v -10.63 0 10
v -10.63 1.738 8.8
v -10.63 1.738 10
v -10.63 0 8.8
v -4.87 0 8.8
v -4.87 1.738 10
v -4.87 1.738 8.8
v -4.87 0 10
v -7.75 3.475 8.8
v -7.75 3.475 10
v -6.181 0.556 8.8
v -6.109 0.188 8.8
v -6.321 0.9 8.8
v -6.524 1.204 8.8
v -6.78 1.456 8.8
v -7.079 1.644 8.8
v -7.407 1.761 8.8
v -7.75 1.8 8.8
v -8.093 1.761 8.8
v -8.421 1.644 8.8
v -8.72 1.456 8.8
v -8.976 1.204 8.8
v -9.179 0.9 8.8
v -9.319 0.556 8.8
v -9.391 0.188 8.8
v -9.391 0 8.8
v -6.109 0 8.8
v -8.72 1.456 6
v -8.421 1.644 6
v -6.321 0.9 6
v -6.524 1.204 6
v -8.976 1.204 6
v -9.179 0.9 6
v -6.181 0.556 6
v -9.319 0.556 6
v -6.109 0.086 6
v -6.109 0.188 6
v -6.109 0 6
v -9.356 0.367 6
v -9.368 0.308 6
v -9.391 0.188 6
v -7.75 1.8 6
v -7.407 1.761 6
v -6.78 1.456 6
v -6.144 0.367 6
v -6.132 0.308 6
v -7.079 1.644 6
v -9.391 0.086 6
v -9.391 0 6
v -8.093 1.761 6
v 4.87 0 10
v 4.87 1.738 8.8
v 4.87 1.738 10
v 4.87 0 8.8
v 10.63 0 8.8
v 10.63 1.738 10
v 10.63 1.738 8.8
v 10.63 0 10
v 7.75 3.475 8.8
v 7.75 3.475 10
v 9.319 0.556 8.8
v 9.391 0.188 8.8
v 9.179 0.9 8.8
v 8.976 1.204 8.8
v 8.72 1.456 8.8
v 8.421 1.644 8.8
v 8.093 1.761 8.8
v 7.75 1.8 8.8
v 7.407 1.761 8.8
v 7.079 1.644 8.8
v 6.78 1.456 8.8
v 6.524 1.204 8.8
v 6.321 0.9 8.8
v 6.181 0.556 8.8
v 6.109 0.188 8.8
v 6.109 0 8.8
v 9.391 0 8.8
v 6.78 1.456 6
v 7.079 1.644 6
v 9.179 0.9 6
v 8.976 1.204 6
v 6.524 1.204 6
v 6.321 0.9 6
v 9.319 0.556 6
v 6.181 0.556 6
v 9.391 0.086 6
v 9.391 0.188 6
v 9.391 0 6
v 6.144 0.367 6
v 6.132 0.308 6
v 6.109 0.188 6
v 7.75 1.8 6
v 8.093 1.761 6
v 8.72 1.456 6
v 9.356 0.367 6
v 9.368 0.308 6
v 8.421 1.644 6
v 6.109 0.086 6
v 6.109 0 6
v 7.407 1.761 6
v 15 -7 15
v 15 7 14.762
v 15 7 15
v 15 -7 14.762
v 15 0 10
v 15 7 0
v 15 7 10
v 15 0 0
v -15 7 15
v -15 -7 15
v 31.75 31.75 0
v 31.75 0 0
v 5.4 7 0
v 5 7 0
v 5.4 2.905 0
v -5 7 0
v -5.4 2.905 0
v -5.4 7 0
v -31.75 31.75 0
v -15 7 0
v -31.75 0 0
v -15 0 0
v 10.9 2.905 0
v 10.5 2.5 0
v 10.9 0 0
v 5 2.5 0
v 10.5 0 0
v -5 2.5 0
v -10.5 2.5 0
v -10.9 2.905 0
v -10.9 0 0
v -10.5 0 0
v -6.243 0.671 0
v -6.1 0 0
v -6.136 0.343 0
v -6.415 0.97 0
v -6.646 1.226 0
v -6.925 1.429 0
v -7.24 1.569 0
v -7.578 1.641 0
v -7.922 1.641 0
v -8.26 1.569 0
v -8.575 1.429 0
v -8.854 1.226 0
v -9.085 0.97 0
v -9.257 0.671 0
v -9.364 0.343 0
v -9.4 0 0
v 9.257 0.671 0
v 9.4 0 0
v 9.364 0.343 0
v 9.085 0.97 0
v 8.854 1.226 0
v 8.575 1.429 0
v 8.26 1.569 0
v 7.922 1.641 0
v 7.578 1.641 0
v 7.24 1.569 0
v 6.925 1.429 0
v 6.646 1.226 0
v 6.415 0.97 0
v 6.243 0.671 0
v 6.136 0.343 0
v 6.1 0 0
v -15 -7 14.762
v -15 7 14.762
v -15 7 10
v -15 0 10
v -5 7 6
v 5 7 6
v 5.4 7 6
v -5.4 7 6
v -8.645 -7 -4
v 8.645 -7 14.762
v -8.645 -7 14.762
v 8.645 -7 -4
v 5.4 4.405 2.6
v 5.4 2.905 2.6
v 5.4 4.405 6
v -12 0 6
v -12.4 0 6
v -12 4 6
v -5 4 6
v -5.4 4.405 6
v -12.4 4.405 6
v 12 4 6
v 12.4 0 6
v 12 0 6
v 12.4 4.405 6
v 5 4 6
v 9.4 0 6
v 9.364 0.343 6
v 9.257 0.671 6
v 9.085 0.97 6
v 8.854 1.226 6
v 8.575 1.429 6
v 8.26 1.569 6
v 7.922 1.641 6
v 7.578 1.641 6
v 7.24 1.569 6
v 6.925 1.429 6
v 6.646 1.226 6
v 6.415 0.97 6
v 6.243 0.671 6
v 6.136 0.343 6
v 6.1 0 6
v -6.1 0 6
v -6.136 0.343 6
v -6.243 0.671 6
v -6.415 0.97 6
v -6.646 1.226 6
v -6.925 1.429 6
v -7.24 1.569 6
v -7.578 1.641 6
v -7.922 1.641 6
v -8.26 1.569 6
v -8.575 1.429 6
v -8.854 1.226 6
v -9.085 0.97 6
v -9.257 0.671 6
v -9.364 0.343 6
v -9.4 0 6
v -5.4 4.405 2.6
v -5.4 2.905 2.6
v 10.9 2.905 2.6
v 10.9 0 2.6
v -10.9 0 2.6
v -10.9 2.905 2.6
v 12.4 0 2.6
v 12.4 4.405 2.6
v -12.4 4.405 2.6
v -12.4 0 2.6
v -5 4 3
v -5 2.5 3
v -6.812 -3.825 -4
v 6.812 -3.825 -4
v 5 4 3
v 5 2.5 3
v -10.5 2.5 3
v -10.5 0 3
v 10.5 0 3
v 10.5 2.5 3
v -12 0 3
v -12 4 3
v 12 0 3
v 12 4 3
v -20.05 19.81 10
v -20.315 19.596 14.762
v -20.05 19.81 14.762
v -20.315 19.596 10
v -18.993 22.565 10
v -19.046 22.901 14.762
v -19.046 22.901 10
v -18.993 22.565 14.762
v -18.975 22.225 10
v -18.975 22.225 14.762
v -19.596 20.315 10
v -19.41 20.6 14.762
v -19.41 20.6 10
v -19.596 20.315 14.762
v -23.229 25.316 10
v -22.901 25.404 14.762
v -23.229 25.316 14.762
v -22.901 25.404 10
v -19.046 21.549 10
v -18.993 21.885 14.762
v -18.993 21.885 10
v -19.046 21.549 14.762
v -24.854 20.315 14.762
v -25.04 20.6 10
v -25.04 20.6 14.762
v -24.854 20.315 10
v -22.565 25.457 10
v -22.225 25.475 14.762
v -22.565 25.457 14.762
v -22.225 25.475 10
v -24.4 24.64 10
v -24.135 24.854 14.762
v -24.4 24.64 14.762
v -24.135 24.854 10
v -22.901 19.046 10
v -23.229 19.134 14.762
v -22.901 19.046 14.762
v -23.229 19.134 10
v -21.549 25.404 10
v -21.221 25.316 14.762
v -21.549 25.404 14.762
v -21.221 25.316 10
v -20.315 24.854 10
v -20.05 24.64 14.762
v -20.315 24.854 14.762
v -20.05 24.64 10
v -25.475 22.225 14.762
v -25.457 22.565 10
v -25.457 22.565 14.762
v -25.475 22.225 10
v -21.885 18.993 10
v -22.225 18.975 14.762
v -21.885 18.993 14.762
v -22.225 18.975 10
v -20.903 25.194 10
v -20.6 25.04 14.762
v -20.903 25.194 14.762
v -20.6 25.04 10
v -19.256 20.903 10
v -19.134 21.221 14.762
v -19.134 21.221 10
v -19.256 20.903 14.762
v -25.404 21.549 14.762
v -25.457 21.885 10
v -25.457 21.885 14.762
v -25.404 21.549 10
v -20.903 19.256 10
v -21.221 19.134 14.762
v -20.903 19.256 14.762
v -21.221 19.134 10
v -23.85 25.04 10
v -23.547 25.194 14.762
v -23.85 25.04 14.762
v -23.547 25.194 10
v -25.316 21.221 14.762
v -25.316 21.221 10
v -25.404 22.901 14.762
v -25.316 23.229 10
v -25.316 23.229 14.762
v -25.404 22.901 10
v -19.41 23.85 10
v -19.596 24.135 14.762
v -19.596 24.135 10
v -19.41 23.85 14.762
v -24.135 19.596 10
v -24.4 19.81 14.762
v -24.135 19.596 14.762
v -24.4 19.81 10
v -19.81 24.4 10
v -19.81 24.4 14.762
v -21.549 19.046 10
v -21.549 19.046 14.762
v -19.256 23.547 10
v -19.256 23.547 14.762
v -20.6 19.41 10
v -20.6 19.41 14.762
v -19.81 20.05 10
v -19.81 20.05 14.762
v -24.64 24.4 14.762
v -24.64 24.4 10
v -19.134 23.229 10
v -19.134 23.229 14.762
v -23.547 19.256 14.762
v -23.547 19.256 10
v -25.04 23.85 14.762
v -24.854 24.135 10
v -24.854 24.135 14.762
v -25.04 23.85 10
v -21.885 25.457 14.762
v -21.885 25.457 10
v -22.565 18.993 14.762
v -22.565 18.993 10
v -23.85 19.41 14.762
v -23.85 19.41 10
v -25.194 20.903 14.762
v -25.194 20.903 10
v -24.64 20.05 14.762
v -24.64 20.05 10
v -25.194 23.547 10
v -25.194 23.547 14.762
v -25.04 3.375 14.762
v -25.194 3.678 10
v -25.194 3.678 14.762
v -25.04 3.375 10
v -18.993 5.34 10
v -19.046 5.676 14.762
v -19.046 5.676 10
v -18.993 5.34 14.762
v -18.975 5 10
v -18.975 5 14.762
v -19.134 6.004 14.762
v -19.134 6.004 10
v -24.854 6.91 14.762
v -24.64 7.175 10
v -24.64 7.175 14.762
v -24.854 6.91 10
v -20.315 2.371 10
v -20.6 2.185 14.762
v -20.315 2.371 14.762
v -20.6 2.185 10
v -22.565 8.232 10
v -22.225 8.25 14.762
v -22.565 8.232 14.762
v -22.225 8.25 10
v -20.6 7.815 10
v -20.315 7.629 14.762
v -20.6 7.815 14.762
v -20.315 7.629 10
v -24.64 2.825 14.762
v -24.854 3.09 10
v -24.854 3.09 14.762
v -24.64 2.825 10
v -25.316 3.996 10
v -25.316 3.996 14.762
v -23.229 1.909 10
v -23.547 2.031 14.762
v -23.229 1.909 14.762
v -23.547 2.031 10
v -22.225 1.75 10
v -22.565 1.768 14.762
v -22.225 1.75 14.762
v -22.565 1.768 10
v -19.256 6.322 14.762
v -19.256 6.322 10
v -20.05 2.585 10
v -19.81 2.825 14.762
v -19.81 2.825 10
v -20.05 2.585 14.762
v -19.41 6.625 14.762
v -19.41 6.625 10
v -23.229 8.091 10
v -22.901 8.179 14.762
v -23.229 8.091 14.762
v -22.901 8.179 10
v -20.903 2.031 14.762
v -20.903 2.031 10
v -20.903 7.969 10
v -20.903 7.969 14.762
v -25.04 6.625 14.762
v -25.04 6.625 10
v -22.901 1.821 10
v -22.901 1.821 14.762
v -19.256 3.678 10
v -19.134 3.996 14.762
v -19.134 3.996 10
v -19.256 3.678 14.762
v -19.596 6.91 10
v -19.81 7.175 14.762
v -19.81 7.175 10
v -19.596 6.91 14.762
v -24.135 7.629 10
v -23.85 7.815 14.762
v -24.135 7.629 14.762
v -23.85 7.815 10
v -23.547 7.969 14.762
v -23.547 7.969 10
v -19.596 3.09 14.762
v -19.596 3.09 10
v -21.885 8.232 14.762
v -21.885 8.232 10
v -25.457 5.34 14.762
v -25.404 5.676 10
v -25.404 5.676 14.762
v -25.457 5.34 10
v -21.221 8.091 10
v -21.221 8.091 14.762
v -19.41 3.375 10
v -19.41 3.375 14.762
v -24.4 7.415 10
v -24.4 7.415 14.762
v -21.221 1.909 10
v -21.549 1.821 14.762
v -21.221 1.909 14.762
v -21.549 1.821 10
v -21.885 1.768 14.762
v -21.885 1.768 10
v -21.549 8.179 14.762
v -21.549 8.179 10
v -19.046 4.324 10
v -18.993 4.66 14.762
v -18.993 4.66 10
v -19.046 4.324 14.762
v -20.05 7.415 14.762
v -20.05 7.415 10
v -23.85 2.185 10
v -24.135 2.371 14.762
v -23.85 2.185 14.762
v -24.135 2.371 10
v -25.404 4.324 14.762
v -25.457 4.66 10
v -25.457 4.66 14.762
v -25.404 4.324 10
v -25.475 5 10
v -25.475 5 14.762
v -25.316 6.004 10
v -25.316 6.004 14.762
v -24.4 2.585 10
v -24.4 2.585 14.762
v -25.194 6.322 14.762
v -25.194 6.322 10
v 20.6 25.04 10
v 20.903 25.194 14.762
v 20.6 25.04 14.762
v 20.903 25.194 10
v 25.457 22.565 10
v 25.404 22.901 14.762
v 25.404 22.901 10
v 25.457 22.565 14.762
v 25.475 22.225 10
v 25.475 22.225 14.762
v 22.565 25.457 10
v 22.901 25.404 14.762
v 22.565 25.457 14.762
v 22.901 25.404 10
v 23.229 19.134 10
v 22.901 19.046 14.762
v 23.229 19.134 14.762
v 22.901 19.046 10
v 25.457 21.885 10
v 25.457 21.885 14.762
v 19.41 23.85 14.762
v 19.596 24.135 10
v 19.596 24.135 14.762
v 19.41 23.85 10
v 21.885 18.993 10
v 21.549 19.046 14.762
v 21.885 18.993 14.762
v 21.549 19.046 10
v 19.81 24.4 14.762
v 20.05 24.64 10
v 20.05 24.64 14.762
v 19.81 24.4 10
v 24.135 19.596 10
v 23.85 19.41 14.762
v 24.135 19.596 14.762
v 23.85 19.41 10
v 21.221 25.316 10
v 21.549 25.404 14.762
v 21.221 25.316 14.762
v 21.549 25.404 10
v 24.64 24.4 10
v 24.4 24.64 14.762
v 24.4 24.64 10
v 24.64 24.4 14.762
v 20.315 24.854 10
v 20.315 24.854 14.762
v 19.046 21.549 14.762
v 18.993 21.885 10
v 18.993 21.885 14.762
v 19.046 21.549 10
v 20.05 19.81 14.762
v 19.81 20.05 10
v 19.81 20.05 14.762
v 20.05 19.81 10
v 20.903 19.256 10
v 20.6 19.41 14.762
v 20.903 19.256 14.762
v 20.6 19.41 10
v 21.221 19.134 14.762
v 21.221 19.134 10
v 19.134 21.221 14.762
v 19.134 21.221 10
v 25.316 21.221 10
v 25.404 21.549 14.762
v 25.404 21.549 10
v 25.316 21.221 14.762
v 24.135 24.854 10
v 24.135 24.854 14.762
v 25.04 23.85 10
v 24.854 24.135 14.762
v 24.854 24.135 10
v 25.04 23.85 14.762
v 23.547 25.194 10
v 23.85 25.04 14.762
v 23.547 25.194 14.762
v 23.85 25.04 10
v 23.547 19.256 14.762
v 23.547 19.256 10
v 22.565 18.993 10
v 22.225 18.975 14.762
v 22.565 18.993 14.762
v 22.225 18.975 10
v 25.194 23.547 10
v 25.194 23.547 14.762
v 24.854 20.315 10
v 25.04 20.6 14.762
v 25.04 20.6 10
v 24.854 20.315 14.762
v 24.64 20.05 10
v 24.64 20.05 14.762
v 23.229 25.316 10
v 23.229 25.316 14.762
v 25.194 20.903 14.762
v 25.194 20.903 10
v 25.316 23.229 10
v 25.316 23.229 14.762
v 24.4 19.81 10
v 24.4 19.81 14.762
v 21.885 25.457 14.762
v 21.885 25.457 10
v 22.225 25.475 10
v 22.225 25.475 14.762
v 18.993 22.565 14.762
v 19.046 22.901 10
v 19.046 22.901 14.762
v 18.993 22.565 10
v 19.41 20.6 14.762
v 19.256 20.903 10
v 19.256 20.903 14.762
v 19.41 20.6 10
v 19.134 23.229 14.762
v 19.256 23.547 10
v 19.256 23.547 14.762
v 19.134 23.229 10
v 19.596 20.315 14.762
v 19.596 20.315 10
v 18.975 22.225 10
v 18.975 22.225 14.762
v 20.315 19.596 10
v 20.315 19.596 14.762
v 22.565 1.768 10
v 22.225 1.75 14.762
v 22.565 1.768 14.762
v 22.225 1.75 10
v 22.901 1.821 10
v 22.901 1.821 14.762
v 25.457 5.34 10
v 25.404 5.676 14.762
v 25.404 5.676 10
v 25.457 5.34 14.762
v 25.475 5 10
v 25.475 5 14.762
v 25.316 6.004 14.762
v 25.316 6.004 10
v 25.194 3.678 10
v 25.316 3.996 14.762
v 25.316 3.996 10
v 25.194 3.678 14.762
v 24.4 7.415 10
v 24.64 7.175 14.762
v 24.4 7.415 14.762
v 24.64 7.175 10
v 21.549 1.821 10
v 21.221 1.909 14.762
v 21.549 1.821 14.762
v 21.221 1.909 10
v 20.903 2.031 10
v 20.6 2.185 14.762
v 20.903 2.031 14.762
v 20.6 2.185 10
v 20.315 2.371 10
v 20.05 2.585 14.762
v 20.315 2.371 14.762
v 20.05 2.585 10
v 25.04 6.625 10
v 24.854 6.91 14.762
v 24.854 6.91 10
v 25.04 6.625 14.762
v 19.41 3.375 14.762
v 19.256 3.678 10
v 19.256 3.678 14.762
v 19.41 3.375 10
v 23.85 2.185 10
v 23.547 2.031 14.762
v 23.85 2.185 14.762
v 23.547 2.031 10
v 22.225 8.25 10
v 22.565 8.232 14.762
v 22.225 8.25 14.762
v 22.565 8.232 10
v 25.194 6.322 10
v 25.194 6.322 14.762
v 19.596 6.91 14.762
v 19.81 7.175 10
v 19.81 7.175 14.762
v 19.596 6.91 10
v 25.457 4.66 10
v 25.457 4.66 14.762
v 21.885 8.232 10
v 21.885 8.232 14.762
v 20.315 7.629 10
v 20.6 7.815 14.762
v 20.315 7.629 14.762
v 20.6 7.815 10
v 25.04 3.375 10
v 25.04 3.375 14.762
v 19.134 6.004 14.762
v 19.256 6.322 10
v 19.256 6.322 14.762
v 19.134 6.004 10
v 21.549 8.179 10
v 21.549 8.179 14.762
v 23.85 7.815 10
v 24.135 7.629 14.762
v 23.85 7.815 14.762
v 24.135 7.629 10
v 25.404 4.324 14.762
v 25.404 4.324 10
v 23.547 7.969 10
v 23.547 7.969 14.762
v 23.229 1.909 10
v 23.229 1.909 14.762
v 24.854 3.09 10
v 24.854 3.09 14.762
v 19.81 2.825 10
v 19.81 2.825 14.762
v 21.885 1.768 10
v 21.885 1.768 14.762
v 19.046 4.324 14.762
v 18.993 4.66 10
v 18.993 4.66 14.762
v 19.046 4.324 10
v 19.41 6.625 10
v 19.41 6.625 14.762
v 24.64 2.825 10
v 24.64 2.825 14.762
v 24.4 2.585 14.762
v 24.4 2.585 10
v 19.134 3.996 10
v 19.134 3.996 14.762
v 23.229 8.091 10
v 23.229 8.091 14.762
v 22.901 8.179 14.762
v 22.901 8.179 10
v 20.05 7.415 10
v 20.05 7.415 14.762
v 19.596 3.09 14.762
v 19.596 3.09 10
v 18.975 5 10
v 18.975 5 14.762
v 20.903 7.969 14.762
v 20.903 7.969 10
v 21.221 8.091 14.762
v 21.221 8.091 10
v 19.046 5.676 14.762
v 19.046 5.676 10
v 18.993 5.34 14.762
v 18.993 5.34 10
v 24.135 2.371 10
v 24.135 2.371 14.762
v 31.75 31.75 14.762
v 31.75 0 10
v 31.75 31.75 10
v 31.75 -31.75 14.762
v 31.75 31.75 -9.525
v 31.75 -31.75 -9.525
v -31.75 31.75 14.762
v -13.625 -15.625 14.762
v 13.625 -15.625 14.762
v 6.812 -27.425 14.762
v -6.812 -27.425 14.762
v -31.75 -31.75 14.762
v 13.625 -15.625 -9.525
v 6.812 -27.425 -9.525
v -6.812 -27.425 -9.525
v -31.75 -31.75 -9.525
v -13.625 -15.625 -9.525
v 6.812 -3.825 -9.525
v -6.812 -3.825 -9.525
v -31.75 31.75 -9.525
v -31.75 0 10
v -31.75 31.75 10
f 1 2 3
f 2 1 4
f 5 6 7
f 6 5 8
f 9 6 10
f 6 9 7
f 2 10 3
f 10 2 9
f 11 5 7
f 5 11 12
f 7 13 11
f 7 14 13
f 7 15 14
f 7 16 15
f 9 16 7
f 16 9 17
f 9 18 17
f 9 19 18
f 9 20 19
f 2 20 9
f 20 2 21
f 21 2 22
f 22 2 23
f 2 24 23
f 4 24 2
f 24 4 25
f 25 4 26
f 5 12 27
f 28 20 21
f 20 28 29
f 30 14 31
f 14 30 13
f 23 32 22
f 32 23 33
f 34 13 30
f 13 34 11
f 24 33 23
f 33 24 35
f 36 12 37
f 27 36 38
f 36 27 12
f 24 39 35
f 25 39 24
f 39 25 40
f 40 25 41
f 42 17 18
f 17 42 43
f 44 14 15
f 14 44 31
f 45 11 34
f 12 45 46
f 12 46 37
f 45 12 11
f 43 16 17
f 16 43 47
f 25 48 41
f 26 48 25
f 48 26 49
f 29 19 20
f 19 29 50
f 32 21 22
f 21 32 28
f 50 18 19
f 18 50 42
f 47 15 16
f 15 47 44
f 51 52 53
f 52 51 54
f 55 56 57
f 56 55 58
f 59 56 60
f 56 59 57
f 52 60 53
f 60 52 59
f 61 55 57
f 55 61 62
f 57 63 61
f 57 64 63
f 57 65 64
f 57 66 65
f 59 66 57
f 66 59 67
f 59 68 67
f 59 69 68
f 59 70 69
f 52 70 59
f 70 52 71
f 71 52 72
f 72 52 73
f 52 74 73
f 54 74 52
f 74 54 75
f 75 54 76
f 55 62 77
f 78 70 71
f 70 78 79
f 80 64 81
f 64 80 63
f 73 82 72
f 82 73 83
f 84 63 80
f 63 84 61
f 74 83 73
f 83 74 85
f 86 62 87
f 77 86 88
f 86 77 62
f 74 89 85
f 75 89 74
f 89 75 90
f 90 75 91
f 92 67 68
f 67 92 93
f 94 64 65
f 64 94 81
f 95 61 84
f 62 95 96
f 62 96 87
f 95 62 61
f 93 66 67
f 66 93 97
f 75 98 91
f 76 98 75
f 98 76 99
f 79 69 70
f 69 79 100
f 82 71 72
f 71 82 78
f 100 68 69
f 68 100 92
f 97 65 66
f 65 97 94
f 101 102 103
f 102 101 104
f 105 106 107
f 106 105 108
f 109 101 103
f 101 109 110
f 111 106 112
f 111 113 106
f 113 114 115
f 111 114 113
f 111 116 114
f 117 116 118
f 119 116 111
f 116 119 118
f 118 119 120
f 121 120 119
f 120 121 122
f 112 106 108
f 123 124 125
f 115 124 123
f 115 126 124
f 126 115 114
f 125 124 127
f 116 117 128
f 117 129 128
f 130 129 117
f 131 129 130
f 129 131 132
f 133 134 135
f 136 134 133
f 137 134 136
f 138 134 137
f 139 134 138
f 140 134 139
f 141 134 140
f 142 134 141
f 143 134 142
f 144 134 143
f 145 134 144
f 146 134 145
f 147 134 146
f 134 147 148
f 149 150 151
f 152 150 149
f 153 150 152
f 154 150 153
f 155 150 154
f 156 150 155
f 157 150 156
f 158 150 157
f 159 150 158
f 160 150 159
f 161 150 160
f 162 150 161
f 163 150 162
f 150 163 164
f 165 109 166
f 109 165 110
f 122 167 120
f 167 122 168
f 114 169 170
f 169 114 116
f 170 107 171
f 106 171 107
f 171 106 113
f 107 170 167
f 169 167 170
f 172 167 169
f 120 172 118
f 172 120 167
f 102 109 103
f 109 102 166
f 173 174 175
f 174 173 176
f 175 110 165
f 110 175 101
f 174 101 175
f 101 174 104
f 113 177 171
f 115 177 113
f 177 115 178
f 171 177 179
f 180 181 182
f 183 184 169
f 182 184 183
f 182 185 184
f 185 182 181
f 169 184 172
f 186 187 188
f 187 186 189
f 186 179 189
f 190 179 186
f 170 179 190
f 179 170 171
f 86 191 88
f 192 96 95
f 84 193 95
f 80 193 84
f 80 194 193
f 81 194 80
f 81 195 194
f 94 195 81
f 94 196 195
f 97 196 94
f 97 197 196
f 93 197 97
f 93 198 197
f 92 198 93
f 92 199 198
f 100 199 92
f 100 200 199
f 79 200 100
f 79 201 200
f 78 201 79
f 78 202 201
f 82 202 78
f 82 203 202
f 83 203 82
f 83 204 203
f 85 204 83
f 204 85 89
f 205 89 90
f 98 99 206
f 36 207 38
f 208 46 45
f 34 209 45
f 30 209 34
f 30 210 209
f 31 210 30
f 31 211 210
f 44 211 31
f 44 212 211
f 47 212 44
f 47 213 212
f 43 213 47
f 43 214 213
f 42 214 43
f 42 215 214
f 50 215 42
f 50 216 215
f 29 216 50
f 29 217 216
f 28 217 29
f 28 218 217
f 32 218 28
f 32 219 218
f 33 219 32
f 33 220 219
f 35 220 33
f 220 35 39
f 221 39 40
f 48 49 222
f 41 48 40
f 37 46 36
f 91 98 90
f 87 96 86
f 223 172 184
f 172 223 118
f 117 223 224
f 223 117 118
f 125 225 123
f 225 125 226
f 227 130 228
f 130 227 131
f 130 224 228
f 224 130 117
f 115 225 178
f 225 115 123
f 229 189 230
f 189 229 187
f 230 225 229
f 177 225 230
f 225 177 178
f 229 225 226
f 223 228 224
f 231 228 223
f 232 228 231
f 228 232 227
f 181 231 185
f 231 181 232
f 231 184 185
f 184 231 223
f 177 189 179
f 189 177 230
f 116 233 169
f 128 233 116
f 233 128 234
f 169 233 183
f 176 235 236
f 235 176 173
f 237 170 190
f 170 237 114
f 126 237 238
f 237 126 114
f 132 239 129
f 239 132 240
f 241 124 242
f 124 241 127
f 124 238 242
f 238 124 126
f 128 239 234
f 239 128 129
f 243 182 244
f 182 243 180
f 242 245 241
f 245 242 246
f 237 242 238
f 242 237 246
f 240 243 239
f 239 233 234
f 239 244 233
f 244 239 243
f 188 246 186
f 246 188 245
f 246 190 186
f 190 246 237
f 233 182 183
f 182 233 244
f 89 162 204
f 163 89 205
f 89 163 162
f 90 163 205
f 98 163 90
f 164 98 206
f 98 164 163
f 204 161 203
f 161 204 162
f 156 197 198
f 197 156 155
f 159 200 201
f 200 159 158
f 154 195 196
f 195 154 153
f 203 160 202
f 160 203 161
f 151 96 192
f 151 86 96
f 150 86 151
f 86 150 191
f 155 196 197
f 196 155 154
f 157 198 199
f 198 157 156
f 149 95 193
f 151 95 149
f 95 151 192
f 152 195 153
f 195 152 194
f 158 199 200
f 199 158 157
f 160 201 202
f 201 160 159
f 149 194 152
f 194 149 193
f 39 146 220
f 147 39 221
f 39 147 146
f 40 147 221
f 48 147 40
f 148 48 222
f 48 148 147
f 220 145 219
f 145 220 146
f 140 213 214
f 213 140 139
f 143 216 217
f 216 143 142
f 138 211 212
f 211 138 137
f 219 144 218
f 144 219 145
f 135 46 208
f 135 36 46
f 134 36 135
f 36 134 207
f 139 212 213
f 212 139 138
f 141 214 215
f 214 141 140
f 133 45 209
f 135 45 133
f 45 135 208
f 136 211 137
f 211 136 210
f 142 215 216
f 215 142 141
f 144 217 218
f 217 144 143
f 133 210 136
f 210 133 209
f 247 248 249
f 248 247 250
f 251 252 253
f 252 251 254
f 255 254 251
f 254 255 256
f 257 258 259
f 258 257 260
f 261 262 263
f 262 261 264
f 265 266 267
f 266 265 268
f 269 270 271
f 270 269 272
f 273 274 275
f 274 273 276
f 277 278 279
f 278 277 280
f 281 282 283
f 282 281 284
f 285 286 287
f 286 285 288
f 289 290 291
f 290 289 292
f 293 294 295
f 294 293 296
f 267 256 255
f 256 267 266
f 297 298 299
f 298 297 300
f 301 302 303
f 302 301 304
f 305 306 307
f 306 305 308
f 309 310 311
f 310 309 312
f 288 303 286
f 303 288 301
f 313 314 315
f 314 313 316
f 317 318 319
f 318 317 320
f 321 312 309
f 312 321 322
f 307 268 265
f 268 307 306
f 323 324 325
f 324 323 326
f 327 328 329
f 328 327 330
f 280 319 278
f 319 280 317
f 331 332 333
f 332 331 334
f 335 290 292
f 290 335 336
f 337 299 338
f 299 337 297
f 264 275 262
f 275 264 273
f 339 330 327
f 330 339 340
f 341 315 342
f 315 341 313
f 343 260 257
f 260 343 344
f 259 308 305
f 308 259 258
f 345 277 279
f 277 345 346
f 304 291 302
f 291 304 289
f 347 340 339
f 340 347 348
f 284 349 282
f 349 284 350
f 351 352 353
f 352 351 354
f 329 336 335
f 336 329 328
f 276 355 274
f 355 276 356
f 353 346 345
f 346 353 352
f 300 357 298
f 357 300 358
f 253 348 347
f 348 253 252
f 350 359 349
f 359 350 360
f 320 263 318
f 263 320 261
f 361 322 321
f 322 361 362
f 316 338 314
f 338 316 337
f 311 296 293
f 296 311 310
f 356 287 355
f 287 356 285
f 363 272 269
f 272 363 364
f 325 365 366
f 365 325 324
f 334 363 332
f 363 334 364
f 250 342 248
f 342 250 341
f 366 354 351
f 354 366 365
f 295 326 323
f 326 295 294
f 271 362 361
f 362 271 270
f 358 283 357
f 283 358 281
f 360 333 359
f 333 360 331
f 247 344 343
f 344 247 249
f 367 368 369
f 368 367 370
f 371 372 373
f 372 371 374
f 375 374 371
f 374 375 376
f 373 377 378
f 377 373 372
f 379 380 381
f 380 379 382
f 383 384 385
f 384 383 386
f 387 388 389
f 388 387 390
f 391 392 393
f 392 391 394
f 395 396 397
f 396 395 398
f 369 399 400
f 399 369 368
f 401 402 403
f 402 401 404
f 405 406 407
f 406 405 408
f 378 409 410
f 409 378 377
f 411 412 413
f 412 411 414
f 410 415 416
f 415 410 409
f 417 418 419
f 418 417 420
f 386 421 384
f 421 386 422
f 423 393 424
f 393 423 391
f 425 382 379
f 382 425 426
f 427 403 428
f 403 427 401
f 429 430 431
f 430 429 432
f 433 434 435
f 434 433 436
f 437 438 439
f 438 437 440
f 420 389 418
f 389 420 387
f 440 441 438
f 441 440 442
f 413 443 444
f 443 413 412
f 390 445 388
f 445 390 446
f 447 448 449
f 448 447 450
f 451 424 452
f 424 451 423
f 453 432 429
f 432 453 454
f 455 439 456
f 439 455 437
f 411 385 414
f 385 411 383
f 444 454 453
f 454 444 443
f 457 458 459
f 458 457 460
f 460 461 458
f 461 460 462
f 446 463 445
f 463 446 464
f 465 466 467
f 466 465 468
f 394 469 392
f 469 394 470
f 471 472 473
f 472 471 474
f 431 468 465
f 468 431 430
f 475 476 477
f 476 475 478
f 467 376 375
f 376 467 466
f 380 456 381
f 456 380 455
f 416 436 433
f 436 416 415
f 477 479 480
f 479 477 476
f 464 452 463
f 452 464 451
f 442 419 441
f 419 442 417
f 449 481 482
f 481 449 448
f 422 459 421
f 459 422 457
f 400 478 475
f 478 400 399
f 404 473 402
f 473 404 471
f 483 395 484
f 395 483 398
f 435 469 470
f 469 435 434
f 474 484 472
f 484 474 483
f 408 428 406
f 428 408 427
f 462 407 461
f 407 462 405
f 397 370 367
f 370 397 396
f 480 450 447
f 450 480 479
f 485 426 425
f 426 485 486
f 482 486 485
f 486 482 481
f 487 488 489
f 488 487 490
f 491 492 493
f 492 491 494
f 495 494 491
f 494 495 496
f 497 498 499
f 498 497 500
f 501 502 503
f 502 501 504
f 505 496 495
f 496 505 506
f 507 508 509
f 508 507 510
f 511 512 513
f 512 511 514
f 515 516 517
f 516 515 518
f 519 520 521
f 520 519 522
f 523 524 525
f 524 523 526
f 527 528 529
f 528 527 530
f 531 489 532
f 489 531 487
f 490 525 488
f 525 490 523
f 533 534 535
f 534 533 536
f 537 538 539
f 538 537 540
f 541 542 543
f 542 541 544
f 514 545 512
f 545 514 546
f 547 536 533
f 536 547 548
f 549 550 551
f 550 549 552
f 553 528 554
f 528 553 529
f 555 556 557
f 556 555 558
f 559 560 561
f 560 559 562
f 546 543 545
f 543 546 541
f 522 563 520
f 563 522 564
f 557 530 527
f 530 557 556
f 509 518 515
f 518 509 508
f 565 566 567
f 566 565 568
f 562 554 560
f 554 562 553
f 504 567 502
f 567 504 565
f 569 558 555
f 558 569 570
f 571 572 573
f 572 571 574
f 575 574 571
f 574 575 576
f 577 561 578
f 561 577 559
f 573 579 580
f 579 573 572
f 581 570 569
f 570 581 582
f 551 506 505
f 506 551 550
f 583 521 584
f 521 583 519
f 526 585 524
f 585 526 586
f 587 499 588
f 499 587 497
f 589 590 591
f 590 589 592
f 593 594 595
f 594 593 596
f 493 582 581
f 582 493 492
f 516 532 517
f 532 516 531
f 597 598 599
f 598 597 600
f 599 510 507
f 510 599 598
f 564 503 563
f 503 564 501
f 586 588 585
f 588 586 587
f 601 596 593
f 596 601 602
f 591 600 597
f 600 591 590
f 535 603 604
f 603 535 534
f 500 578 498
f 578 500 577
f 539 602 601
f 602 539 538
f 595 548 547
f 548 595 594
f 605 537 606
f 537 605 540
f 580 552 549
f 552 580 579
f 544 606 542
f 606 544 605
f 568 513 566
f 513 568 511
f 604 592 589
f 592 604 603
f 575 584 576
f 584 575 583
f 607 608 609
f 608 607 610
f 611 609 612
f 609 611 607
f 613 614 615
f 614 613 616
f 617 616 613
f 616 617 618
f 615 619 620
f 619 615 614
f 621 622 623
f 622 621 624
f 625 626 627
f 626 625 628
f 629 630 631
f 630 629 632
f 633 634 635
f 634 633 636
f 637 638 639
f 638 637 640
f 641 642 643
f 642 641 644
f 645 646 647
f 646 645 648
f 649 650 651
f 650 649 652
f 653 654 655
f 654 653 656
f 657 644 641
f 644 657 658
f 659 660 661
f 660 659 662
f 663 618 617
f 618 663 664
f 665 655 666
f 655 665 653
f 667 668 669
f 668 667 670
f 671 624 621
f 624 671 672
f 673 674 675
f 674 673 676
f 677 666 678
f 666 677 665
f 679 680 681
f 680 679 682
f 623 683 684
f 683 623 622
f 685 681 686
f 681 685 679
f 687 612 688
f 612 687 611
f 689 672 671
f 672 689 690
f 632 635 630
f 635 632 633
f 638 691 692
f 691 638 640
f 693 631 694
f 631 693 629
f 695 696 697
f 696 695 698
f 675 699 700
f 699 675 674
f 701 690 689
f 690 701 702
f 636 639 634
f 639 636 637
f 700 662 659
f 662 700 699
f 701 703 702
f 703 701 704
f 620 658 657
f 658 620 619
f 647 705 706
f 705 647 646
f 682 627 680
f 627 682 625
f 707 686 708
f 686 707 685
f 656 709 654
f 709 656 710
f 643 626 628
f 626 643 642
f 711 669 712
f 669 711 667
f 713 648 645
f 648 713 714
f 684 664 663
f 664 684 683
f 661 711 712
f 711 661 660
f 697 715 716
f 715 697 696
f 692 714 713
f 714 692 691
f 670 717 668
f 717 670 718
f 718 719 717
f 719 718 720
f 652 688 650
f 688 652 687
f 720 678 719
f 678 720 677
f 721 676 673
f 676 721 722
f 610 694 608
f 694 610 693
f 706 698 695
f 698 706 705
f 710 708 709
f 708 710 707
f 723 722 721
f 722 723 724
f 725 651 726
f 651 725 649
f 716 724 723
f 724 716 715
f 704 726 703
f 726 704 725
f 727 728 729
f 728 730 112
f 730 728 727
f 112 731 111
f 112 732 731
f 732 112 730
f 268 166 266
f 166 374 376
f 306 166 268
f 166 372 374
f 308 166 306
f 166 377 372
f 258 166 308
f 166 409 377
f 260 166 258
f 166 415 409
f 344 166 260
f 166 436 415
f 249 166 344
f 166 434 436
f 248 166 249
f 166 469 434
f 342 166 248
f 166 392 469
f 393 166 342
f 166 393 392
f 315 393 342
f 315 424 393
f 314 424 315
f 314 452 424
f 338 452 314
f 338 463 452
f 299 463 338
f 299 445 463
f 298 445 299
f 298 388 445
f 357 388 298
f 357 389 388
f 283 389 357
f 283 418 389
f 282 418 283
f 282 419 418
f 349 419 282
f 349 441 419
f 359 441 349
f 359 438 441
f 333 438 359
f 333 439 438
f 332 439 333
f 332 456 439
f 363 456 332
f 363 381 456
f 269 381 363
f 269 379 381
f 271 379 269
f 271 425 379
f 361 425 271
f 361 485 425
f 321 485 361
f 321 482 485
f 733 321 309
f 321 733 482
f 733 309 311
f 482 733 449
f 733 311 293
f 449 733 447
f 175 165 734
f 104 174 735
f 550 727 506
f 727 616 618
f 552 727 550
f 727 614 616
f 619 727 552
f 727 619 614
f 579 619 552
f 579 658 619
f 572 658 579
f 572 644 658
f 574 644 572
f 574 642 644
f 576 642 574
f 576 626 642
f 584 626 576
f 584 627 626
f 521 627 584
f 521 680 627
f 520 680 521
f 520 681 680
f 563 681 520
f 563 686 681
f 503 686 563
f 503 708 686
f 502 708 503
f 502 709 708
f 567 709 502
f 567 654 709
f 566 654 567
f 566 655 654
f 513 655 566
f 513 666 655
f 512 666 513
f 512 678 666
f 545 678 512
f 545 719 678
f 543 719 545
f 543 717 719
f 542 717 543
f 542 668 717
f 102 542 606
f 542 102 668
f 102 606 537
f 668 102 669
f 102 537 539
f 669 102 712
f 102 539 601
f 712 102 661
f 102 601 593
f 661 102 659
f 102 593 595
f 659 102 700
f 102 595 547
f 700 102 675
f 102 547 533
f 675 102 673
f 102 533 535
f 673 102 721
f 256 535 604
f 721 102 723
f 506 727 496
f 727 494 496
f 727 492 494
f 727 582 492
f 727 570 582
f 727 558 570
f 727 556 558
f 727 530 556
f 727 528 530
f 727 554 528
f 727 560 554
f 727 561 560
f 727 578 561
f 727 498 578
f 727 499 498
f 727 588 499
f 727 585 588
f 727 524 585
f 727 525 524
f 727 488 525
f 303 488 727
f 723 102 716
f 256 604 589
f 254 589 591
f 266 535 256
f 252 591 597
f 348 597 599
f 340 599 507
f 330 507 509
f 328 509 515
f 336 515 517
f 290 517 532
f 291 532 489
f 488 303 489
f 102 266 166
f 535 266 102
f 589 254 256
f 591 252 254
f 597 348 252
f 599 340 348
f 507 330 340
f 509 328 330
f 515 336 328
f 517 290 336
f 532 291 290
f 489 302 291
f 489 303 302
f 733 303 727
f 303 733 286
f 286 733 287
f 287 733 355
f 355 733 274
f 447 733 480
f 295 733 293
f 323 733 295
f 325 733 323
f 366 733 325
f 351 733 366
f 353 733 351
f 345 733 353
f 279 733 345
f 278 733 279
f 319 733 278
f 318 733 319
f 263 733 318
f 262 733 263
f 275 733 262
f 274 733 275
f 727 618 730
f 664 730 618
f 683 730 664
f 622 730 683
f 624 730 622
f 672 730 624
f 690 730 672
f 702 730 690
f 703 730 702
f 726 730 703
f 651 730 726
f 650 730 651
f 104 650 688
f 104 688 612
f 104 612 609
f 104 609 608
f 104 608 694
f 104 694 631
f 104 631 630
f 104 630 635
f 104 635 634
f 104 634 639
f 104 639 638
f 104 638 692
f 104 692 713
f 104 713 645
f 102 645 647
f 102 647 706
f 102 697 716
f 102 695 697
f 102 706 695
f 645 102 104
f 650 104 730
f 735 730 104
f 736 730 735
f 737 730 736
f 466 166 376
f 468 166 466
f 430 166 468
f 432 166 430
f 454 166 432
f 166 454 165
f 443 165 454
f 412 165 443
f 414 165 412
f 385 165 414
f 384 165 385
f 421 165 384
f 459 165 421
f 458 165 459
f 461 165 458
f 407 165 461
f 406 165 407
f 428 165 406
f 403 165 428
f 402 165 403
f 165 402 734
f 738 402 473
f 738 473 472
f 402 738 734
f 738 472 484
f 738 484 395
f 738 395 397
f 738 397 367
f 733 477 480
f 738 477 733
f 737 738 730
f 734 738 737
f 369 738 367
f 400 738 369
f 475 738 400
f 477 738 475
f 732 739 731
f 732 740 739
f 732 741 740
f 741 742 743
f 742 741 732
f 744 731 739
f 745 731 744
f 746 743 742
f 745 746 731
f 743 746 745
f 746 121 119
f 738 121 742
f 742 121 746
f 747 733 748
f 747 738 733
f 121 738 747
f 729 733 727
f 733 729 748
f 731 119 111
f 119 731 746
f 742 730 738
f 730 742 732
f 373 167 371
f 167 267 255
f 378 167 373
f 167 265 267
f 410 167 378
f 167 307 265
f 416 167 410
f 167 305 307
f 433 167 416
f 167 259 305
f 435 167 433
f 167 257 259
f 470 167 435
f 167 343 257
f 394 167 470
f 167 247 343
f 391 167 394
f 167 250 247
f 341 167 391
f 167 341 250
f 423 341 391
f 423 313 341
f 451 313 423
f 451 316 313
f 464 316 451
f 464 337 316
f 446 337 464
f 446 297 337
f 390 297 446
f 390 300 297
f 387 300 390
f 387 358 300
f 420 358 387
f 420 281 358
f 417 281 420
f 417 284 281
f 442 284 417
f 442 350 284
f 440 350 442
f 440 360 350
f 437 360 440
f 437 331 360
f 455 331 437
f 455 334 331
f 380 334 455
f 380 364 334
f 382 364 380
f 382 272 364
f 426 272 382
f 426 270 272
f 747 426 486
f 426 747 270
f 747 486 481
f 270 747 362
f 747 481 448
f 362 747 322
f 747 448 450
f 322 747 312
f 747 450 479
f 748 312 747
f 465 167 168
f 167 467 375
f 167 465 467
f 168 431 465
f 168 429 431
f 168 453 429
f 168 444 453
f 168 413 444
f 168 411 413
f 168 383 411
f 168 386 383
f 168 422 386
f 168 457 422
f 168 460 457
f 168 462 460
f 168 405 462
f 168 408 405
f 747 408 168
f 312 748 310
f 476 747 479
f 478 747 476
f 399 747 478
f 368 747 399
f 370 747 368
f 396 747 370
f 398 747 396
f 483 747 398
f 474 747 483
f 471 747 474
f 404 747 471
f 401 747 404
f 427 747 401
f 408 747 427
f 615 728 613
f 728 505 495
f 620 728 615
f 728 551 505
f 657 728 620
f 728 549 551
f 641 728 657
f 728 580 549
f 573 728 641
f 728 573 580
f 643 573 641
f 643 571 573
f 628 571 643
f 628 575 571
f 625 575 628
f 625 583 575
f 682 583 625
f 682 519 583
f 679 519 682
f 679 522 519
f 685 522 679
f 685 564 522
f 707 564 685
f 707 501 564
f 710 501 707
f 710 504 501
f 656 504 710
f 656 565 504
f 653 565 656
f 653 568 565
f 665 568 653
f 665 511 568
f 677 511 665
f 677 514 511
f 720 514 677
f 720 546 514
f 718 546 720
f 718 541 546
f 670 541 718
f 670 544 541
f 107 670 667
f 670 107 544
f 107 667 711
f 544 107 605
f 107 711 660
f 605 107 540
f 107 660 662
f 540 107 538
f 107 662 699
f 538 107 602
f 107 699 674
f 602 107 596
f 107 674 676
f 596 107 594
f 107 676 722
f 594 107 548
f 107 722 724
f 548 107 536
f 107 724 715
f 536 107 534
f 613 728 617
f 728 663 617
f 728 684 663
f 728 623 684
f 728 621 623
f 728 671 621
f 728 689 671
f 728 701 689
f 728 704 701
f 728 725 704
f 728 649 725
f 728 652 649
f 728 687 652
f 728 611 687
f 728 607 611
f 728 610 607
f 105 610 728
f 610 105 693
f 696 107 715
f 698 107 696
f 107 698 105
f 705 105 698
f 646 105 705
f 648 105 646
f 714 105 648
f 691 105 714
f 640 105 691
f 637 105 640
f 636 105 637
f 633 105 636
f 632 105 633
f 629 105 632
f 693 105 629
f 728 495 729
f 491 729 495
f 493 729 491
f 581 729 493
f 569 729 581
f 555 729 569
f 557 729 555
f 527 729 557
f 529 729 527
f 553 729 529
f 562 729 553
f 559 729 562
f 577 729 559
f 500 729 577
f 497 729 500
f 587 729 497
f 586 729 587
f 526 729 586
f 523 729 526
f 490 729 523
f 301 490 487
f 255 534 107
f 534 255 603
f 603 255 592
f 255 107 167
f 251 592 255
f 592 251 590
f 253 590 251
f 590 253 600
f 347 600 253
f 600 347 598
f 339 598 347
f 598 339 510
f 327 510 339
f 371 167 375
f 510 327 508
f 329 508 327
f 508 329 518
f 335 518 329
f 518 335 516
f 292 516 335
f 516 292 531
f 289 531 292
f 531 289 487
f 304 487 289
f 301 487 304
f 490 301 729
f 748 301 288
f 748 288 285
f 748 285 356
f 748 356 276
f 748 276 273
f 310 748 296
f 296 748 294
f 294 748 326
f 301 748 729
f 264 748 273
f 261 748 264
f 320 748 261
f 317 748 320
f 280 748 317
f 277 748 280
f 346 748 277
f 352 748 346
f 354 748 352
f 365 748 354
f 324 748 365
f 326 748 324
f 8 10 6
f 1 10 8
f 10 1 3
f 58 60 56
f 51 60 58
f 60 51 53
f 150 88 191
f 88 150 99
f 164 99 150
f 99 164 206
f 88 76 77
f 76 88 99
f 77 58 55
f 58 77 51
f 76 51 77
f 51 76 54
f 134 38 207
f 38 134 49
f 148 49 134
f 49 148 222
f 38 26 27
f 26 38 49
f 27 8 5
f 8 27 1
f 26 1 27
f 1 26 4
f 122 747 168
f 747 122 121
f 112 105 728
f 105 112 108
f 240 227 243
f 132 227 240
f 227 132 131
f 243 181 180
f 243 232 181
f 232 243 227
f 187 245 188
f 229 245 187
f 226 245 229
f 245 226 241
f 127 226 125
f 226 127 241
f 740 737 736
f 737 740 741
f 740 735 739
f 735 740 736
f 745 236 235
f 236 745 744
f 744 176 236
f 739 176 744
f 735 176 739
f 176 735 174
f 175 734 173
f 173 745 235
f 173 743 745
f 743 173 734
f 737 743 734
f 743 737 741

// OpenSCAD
include <BOSL2/std.scad>;

module side_bracket(
    base_width = 2.5*INCH,
    top_height = 3/16*INCH,
    panel_height = 10,
    bottom_height = 3/8*INCH,
    bolt_distance = 1.75*INCH,
    bolt_hole_diameter = 6.5,
)
{
    height = top_height + panel_height + bottom_height; 

    difference() {
        translate([0, 0, height/2 - bottom_height])
        cube([base_width, base_width, height], center=true);

        translate([-50, 0, 0])
        #cube([100, 100, panel_height]);

        translate([0, -27.25/2 -2, -bottom_height-0.1])
        cylinder(h=height+0.2,d=27.25,$fn=6);
        
        for (x = [-bolt_distance/2, +bolt_distance/2])
        for (y = [+bolt_distance/2, +5])
        translate([x, y, 0])
        cylinder(d=bolt_hole_diameter, h=height+0.2);
    }
}


side_bracket();
